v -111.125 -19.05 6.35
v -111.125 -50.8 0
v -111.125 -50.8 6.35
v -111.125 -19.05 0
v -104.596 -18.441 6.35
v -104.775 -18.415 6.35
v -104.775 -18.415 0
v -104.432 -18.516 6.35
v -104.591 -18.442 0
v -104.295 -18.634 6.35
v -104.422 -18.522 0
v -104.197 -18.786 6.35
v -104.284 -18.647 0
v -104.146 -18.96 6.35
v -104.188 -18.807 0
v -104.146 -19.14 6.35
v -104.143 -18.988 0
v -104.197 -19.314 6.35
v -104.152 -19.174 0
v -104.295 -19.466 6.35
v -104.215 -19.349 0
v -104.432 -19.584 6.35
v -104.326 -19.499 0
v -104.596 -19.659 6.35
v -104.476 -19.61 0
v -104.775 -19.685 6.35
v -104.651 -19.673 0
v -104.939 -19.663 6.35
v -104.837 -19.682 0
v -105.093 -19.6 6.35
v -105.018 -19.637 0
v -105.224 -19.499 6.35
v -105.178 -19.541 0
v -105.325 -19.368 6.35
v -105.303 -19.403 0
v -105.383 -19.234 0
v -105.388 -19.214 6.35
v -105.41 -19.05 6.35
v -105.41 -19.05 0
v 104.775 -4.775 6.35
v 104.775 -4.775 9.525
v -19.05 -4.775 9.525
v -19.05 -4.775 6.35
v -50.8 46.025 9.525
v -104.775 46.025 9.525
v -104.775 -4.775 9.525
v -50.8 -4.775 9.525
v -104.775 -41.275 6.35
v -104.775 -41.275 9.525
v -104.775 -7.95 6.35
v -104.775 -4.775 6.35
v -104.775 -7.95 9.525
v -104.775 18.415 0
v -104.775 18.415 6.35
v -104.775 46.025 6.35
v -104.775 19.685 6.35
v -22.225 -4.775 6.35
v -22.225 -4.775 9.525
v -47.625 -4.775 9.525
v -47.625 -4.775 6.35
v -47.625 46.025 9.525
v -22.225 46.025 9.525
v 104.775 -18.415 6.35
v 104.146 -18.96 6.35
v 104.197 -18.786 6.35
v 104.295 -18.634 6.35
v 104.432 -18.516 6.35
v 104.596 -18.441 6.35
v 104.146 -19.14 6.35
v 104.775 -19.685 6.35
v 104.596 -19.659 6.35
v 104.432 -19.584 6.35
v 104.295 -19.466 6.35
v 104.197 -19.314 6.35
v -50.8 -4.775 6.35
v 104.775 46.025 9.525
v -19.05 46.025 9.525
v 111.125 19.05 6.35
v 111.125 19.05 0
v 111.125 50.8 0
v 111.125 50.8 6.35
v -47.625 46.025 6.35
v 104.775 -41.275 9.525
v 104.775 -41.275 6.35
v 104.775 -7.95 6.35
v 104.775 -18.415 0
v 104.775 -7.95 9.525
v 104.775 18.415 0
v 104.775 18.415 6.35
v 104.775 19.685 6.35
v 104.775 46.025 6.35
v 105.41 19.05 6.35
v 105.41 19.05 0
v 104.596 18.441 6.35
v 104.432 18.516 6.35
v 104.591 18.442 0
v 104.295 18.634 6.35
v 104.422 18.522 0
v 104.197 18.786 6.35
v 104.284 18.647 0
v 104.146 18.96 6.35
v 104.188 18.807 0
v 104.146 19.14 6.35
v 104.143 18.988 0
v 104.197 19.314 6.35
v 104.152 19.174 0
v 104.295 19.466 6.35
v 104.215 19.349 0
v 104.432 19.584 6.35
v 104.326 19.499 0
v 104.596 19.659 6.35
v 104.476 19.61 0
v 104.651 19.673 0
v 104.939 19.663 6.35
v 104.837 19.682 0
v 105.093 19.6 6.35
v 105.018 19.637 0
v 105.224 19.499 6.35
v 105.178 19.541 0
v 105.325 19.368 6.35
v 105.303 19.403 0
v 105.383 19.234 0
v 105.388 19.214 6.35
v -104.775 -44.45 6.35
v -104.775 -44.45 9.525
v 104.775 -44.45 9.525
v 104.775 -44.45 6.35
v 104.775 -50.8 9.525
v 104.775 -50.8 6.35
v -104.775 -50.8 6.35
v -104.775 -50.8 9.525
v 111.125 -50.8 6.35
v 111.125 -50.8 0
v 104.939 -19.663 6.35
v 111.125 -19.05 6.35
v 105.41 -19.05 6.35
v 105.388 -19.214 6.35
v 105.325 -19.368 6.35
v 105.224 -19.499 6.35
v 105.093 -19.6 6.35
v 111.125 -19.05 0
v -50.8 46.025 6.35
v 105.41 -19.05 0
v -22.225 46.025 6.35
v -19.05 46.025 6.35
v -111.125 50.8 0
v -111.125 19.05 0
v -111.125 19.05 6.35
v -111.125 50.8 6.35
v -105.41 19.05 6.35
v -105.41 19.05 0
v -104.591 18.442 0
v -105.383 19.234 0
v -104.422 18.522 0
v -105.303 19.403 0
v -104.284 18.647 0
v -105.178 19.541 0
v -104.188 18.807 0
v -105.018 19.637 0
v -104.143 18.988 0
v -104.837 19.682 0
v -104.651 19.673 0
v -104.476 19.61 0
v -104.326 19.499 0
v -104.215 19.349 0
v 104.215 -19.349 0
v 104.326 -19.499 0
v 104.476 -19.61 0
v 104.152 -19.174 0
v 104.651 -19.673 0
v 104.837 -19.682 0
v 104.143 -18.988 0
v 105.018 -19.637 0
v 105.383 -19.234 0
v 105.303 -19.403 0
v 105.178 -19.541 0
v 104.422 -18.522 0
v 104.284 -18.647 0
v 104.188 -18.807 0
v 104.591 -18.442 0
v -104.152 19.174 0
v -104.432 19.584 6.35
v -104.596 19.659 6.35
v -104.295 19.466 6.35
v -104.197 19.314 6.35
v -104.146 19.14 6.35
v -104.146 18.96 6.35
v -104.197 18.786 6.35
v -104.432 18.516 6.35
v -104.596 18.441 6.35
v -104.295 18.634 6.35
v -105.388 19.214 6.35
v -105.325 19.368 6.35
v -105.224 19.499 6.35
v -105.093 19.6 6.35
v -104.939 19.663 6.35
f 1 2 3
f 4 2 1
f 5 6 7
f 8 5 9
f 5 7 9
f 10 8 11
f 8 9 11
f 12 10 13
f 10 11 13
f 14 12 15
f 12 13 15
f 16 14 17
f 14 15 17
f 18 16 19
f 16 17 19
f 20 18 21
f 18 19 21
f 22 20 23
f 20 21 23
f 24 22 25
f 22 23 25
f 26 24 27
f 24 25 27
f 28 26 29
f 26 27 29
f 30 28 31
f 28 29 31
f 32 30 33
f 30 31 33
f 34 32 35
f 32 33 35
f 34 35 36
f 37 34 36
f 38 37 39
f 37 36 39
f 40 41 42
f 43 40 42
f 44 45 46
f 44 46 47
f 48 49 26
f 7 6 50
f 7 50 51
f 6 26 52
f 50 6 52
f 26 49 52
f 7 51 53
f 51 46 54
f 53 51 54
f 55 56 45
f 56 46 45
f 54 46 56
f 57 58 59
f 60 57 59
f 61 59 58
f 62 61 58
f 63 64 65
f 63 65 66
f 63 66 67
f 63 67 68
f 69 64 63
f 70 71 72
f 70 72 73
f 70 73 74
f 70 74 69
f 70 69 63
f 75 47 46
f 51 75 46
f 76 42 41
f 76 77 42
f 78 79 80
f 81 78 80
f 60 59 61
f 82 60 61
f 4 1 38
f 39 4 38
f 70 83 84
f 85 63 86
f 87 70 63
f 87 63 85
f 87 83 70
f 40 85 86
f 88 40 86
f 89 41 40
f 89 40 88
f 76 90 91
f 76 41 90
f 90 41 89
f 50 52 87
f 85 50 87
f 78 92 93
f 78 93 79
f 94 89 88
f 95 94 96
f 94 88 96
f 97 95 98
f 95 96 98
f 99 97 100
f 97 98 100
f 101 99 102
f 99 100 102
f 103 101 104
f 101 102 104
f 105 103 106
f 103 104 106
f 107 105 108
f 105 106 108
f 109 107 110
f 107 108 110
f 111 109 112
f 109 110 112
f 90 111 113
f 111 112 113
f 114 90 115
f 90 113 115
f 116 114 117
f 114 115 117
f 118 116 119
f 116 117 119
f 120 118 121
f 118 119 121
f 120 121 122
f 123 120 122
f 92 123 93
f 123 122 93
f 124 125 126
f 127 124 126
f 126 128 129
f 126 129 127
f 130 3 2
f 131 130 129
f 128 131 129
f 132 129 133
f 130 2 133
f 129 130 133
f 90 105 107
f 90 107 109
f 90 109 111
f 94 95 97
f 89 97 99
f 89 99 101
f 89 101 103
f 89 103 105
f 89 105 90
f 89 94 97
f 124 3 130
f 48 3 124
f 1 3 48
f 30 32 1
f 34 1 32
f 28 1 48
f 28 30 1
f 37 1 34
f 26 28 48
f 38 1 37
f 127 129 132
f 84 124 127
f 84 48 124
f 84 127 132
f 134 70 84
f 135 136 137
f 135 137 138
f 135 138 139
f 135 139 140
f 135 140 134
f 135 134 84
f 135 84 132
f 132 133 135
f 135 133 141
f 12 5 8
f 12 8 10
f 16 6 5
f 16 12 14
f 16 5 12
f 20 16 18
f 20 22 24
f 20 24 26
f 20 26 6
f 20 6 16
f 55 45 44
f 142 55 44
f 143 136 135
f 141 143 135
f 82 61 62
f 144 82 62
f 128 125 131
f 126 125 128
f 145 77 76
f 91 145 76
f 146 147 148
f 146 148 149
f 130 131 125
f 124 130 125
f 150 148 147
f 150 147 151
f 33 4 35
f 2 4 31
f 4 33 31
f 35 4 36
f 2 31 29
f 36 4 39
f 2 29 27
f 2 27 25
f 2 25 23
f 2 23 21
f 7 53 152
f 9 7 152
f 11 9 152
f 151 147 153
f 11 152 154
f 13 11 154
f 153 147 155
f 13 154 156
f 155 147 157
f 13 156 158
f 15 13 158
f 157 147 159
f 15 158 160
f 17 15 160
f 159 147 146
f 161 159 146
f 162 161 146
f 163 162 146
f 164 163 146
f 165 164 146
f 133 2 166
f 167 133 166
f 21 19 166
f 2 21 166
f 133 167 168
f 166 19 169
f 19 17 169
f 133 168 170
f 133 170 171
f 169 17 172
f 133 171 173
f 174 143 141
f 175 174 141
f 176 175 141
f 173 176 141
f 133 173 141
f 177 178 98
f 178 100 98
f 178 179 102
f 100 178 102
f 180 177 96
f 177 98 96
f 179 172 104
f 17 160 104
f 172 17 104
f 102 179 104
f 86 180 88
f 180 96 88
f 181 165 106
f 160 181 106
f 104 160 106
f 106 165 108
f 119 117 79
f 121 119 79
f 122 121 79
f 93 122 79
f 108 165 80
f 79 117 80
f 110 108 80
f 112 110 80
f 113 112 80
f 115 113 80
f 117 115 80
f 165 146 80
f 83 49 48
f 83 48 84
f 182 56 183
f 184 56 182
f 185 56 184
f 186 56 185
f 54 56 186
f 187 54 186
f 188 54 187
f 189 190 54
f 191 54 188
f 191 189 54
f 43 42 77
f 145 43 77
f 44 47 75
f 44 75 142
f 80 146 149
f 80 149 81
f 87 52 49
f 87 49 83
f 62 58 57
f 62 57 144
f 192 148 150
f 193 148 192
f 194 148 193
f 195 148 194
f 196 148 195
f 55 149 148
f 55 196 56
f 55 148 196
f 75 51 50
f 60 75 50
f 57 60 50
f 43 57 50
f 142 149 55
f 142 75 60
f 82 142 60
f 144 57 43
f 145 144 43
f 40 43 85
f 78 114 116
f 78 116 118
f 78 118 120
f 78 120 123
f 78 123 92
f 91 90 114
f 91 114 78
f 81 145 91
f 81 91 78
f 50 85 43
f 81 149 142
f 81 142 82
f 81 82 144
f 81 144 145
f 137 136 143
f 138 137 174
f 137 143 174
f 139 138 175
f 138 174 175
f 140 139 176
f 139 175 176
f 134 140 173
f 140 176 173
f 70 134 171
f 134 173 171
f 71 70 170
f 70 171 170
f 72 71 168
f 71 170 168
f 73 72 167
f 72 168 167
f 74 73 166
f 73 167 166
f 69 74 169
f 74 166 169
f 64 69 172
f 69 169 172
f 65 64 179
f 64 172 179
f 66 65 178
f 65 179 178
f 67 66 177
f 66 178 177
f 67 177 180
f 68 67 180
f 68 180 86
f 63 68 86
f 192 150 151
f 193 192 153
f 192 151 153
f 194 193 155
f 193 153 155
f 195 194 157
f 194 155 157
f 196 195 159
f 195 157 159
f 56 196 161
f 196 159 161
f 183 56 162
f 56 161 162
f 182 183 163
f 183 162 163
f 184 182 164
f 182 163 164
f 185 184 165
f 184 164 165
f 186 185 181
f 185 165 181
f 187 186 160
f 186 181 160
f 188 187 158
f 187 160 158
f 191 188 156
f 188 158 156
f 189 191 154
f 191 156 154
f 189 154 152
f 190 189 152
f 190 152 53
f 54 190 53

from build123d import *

# Parameters (mm, degrees)
F0_W     = 222.25
F0_H     = 101.6
F1_DEPTH = 9.525
F2_W     = 6.35
F2_H     = 38.1
F3_DEPTH = 9.526
F4_W     = 6.35
F4_H     = 31.75
F5_DEPTH = 3.175
F6_W     = 209.55
F6_H     = 3.175
F6_W_2   = 3.175
F6_H_2   = 50.8
F7_DEPTH = 3.175
F9_DEPTH = 6.35


with BuildPart() as f1:
    # F0 (on Top) → F1 (new body)
    with BuildSketch(Plane.XY):
        Rectangle(F0_W, F0_H)
    extrude(amount=F1_DEPTH)

    # F2 (on face) → F3 (cut, through all)
    with BuildSketch(Plane.XY.offset(9.525)):
        with Locations((-107.95, 0)):
            Rectangle(F2_W, F2_H)
        with Locations((107.95, 0)):
            Rectangle(F2_W, F2_H)
    extrude(amount=-F3_DEPTH, mode=Mode.SUBTRACT)

    # F4 (on face) → F5 (cut)
    with BuildSketch(Plane.XY.offset(9.525)):
        Polygon((-111.125, 19.05), (-104.775, 19.05), (-104.775, 46.0248), (104.775, 46.0248), (104.775, 19.05), (111.125, 19.05), (111.125, 50.8), (-111.125, 50.8), align=None)
        with Locations((-107.95, -34.925)):
            Rectangle(F4_W, F4_H)
        with Locations((107.95, -34.925)):
            Rectangle(F4_W, F4_H)
    extrude(amount=-F5_DEPTH, mode=Mode.SUBTRACT)

    # F6 (on face) → F7 (cut)
    with BuildSketch(Plane.XY.offset(9.525)):
        with Locations((0, -42.8625)):
            Rectangle(F6_W, F6_H)
        Polygon((-50.8, -4.7752), (-104.775, -4.7752), (-104.775, -7.9502), (104.775, -7.9502), (104.775, -4.7752), (-19.05, -4.7752), (-22.225, -4.7752), (-47.625, -4.7752), align=None)
        with Locations((-49.2125, 20.6248)):
            Rectangle(F6_W_2, F6_H_2)
        with Locations((-20.6375, 20.6248)):
            Rectangle(F6_W_2, F6_H_2)
    extrude(amount=-F7_DEPTH, mode=Mode.SUBTRACT)

    # F8 (on face) → F9 (cut, through all)
    with BuildSketch(Plane(origin=(0, 0, 0), x_dir=(1, 0, 0), z_dir=(0, 0, -1))):
        with BuildLine():
            Line((104.775, -19.05), (104.775, -18.415))
            ThreePointArc((104.775, -18.415), (104.325987, -19.499013), (105.41, -19.05))
            Line((105.41, -19.05), (104.775, -19.05))
        make_face()
        with BuildLine():
            ThreePointArc((105.41, 19.05), (104.325987, 19.499013), (104.775, 18.415))
            Line((104.775, 18.415), (104.775, 19.05))
            Line((104.775, 19.05), (105.41, 19.05))
        make_face()
        with BuildLine():
            Line((-104.775, 19.05), (-104.775, 18.415))
            ThreePointArc((-104.775, 18.415), (-104.325987, 19.499013), (-105.41, 19.05))
            Line((-105.41, 19.05), (-104.775, 19.05))
        make_face()
        with BuildLine():
            ThreePointArc((-105.41, -19.05), (-104.325987, -19.499013), (-104.775, -18.415))
            Line((-104.775, -18.415), (-104.775, -19.05))
            Line((-104.775, -19.05), (-105.41, -19.05))
        make_face()
    extrude(amount=-F9_DEPTH, mode=Mode.SUBTRACT)


solid = f1.part
